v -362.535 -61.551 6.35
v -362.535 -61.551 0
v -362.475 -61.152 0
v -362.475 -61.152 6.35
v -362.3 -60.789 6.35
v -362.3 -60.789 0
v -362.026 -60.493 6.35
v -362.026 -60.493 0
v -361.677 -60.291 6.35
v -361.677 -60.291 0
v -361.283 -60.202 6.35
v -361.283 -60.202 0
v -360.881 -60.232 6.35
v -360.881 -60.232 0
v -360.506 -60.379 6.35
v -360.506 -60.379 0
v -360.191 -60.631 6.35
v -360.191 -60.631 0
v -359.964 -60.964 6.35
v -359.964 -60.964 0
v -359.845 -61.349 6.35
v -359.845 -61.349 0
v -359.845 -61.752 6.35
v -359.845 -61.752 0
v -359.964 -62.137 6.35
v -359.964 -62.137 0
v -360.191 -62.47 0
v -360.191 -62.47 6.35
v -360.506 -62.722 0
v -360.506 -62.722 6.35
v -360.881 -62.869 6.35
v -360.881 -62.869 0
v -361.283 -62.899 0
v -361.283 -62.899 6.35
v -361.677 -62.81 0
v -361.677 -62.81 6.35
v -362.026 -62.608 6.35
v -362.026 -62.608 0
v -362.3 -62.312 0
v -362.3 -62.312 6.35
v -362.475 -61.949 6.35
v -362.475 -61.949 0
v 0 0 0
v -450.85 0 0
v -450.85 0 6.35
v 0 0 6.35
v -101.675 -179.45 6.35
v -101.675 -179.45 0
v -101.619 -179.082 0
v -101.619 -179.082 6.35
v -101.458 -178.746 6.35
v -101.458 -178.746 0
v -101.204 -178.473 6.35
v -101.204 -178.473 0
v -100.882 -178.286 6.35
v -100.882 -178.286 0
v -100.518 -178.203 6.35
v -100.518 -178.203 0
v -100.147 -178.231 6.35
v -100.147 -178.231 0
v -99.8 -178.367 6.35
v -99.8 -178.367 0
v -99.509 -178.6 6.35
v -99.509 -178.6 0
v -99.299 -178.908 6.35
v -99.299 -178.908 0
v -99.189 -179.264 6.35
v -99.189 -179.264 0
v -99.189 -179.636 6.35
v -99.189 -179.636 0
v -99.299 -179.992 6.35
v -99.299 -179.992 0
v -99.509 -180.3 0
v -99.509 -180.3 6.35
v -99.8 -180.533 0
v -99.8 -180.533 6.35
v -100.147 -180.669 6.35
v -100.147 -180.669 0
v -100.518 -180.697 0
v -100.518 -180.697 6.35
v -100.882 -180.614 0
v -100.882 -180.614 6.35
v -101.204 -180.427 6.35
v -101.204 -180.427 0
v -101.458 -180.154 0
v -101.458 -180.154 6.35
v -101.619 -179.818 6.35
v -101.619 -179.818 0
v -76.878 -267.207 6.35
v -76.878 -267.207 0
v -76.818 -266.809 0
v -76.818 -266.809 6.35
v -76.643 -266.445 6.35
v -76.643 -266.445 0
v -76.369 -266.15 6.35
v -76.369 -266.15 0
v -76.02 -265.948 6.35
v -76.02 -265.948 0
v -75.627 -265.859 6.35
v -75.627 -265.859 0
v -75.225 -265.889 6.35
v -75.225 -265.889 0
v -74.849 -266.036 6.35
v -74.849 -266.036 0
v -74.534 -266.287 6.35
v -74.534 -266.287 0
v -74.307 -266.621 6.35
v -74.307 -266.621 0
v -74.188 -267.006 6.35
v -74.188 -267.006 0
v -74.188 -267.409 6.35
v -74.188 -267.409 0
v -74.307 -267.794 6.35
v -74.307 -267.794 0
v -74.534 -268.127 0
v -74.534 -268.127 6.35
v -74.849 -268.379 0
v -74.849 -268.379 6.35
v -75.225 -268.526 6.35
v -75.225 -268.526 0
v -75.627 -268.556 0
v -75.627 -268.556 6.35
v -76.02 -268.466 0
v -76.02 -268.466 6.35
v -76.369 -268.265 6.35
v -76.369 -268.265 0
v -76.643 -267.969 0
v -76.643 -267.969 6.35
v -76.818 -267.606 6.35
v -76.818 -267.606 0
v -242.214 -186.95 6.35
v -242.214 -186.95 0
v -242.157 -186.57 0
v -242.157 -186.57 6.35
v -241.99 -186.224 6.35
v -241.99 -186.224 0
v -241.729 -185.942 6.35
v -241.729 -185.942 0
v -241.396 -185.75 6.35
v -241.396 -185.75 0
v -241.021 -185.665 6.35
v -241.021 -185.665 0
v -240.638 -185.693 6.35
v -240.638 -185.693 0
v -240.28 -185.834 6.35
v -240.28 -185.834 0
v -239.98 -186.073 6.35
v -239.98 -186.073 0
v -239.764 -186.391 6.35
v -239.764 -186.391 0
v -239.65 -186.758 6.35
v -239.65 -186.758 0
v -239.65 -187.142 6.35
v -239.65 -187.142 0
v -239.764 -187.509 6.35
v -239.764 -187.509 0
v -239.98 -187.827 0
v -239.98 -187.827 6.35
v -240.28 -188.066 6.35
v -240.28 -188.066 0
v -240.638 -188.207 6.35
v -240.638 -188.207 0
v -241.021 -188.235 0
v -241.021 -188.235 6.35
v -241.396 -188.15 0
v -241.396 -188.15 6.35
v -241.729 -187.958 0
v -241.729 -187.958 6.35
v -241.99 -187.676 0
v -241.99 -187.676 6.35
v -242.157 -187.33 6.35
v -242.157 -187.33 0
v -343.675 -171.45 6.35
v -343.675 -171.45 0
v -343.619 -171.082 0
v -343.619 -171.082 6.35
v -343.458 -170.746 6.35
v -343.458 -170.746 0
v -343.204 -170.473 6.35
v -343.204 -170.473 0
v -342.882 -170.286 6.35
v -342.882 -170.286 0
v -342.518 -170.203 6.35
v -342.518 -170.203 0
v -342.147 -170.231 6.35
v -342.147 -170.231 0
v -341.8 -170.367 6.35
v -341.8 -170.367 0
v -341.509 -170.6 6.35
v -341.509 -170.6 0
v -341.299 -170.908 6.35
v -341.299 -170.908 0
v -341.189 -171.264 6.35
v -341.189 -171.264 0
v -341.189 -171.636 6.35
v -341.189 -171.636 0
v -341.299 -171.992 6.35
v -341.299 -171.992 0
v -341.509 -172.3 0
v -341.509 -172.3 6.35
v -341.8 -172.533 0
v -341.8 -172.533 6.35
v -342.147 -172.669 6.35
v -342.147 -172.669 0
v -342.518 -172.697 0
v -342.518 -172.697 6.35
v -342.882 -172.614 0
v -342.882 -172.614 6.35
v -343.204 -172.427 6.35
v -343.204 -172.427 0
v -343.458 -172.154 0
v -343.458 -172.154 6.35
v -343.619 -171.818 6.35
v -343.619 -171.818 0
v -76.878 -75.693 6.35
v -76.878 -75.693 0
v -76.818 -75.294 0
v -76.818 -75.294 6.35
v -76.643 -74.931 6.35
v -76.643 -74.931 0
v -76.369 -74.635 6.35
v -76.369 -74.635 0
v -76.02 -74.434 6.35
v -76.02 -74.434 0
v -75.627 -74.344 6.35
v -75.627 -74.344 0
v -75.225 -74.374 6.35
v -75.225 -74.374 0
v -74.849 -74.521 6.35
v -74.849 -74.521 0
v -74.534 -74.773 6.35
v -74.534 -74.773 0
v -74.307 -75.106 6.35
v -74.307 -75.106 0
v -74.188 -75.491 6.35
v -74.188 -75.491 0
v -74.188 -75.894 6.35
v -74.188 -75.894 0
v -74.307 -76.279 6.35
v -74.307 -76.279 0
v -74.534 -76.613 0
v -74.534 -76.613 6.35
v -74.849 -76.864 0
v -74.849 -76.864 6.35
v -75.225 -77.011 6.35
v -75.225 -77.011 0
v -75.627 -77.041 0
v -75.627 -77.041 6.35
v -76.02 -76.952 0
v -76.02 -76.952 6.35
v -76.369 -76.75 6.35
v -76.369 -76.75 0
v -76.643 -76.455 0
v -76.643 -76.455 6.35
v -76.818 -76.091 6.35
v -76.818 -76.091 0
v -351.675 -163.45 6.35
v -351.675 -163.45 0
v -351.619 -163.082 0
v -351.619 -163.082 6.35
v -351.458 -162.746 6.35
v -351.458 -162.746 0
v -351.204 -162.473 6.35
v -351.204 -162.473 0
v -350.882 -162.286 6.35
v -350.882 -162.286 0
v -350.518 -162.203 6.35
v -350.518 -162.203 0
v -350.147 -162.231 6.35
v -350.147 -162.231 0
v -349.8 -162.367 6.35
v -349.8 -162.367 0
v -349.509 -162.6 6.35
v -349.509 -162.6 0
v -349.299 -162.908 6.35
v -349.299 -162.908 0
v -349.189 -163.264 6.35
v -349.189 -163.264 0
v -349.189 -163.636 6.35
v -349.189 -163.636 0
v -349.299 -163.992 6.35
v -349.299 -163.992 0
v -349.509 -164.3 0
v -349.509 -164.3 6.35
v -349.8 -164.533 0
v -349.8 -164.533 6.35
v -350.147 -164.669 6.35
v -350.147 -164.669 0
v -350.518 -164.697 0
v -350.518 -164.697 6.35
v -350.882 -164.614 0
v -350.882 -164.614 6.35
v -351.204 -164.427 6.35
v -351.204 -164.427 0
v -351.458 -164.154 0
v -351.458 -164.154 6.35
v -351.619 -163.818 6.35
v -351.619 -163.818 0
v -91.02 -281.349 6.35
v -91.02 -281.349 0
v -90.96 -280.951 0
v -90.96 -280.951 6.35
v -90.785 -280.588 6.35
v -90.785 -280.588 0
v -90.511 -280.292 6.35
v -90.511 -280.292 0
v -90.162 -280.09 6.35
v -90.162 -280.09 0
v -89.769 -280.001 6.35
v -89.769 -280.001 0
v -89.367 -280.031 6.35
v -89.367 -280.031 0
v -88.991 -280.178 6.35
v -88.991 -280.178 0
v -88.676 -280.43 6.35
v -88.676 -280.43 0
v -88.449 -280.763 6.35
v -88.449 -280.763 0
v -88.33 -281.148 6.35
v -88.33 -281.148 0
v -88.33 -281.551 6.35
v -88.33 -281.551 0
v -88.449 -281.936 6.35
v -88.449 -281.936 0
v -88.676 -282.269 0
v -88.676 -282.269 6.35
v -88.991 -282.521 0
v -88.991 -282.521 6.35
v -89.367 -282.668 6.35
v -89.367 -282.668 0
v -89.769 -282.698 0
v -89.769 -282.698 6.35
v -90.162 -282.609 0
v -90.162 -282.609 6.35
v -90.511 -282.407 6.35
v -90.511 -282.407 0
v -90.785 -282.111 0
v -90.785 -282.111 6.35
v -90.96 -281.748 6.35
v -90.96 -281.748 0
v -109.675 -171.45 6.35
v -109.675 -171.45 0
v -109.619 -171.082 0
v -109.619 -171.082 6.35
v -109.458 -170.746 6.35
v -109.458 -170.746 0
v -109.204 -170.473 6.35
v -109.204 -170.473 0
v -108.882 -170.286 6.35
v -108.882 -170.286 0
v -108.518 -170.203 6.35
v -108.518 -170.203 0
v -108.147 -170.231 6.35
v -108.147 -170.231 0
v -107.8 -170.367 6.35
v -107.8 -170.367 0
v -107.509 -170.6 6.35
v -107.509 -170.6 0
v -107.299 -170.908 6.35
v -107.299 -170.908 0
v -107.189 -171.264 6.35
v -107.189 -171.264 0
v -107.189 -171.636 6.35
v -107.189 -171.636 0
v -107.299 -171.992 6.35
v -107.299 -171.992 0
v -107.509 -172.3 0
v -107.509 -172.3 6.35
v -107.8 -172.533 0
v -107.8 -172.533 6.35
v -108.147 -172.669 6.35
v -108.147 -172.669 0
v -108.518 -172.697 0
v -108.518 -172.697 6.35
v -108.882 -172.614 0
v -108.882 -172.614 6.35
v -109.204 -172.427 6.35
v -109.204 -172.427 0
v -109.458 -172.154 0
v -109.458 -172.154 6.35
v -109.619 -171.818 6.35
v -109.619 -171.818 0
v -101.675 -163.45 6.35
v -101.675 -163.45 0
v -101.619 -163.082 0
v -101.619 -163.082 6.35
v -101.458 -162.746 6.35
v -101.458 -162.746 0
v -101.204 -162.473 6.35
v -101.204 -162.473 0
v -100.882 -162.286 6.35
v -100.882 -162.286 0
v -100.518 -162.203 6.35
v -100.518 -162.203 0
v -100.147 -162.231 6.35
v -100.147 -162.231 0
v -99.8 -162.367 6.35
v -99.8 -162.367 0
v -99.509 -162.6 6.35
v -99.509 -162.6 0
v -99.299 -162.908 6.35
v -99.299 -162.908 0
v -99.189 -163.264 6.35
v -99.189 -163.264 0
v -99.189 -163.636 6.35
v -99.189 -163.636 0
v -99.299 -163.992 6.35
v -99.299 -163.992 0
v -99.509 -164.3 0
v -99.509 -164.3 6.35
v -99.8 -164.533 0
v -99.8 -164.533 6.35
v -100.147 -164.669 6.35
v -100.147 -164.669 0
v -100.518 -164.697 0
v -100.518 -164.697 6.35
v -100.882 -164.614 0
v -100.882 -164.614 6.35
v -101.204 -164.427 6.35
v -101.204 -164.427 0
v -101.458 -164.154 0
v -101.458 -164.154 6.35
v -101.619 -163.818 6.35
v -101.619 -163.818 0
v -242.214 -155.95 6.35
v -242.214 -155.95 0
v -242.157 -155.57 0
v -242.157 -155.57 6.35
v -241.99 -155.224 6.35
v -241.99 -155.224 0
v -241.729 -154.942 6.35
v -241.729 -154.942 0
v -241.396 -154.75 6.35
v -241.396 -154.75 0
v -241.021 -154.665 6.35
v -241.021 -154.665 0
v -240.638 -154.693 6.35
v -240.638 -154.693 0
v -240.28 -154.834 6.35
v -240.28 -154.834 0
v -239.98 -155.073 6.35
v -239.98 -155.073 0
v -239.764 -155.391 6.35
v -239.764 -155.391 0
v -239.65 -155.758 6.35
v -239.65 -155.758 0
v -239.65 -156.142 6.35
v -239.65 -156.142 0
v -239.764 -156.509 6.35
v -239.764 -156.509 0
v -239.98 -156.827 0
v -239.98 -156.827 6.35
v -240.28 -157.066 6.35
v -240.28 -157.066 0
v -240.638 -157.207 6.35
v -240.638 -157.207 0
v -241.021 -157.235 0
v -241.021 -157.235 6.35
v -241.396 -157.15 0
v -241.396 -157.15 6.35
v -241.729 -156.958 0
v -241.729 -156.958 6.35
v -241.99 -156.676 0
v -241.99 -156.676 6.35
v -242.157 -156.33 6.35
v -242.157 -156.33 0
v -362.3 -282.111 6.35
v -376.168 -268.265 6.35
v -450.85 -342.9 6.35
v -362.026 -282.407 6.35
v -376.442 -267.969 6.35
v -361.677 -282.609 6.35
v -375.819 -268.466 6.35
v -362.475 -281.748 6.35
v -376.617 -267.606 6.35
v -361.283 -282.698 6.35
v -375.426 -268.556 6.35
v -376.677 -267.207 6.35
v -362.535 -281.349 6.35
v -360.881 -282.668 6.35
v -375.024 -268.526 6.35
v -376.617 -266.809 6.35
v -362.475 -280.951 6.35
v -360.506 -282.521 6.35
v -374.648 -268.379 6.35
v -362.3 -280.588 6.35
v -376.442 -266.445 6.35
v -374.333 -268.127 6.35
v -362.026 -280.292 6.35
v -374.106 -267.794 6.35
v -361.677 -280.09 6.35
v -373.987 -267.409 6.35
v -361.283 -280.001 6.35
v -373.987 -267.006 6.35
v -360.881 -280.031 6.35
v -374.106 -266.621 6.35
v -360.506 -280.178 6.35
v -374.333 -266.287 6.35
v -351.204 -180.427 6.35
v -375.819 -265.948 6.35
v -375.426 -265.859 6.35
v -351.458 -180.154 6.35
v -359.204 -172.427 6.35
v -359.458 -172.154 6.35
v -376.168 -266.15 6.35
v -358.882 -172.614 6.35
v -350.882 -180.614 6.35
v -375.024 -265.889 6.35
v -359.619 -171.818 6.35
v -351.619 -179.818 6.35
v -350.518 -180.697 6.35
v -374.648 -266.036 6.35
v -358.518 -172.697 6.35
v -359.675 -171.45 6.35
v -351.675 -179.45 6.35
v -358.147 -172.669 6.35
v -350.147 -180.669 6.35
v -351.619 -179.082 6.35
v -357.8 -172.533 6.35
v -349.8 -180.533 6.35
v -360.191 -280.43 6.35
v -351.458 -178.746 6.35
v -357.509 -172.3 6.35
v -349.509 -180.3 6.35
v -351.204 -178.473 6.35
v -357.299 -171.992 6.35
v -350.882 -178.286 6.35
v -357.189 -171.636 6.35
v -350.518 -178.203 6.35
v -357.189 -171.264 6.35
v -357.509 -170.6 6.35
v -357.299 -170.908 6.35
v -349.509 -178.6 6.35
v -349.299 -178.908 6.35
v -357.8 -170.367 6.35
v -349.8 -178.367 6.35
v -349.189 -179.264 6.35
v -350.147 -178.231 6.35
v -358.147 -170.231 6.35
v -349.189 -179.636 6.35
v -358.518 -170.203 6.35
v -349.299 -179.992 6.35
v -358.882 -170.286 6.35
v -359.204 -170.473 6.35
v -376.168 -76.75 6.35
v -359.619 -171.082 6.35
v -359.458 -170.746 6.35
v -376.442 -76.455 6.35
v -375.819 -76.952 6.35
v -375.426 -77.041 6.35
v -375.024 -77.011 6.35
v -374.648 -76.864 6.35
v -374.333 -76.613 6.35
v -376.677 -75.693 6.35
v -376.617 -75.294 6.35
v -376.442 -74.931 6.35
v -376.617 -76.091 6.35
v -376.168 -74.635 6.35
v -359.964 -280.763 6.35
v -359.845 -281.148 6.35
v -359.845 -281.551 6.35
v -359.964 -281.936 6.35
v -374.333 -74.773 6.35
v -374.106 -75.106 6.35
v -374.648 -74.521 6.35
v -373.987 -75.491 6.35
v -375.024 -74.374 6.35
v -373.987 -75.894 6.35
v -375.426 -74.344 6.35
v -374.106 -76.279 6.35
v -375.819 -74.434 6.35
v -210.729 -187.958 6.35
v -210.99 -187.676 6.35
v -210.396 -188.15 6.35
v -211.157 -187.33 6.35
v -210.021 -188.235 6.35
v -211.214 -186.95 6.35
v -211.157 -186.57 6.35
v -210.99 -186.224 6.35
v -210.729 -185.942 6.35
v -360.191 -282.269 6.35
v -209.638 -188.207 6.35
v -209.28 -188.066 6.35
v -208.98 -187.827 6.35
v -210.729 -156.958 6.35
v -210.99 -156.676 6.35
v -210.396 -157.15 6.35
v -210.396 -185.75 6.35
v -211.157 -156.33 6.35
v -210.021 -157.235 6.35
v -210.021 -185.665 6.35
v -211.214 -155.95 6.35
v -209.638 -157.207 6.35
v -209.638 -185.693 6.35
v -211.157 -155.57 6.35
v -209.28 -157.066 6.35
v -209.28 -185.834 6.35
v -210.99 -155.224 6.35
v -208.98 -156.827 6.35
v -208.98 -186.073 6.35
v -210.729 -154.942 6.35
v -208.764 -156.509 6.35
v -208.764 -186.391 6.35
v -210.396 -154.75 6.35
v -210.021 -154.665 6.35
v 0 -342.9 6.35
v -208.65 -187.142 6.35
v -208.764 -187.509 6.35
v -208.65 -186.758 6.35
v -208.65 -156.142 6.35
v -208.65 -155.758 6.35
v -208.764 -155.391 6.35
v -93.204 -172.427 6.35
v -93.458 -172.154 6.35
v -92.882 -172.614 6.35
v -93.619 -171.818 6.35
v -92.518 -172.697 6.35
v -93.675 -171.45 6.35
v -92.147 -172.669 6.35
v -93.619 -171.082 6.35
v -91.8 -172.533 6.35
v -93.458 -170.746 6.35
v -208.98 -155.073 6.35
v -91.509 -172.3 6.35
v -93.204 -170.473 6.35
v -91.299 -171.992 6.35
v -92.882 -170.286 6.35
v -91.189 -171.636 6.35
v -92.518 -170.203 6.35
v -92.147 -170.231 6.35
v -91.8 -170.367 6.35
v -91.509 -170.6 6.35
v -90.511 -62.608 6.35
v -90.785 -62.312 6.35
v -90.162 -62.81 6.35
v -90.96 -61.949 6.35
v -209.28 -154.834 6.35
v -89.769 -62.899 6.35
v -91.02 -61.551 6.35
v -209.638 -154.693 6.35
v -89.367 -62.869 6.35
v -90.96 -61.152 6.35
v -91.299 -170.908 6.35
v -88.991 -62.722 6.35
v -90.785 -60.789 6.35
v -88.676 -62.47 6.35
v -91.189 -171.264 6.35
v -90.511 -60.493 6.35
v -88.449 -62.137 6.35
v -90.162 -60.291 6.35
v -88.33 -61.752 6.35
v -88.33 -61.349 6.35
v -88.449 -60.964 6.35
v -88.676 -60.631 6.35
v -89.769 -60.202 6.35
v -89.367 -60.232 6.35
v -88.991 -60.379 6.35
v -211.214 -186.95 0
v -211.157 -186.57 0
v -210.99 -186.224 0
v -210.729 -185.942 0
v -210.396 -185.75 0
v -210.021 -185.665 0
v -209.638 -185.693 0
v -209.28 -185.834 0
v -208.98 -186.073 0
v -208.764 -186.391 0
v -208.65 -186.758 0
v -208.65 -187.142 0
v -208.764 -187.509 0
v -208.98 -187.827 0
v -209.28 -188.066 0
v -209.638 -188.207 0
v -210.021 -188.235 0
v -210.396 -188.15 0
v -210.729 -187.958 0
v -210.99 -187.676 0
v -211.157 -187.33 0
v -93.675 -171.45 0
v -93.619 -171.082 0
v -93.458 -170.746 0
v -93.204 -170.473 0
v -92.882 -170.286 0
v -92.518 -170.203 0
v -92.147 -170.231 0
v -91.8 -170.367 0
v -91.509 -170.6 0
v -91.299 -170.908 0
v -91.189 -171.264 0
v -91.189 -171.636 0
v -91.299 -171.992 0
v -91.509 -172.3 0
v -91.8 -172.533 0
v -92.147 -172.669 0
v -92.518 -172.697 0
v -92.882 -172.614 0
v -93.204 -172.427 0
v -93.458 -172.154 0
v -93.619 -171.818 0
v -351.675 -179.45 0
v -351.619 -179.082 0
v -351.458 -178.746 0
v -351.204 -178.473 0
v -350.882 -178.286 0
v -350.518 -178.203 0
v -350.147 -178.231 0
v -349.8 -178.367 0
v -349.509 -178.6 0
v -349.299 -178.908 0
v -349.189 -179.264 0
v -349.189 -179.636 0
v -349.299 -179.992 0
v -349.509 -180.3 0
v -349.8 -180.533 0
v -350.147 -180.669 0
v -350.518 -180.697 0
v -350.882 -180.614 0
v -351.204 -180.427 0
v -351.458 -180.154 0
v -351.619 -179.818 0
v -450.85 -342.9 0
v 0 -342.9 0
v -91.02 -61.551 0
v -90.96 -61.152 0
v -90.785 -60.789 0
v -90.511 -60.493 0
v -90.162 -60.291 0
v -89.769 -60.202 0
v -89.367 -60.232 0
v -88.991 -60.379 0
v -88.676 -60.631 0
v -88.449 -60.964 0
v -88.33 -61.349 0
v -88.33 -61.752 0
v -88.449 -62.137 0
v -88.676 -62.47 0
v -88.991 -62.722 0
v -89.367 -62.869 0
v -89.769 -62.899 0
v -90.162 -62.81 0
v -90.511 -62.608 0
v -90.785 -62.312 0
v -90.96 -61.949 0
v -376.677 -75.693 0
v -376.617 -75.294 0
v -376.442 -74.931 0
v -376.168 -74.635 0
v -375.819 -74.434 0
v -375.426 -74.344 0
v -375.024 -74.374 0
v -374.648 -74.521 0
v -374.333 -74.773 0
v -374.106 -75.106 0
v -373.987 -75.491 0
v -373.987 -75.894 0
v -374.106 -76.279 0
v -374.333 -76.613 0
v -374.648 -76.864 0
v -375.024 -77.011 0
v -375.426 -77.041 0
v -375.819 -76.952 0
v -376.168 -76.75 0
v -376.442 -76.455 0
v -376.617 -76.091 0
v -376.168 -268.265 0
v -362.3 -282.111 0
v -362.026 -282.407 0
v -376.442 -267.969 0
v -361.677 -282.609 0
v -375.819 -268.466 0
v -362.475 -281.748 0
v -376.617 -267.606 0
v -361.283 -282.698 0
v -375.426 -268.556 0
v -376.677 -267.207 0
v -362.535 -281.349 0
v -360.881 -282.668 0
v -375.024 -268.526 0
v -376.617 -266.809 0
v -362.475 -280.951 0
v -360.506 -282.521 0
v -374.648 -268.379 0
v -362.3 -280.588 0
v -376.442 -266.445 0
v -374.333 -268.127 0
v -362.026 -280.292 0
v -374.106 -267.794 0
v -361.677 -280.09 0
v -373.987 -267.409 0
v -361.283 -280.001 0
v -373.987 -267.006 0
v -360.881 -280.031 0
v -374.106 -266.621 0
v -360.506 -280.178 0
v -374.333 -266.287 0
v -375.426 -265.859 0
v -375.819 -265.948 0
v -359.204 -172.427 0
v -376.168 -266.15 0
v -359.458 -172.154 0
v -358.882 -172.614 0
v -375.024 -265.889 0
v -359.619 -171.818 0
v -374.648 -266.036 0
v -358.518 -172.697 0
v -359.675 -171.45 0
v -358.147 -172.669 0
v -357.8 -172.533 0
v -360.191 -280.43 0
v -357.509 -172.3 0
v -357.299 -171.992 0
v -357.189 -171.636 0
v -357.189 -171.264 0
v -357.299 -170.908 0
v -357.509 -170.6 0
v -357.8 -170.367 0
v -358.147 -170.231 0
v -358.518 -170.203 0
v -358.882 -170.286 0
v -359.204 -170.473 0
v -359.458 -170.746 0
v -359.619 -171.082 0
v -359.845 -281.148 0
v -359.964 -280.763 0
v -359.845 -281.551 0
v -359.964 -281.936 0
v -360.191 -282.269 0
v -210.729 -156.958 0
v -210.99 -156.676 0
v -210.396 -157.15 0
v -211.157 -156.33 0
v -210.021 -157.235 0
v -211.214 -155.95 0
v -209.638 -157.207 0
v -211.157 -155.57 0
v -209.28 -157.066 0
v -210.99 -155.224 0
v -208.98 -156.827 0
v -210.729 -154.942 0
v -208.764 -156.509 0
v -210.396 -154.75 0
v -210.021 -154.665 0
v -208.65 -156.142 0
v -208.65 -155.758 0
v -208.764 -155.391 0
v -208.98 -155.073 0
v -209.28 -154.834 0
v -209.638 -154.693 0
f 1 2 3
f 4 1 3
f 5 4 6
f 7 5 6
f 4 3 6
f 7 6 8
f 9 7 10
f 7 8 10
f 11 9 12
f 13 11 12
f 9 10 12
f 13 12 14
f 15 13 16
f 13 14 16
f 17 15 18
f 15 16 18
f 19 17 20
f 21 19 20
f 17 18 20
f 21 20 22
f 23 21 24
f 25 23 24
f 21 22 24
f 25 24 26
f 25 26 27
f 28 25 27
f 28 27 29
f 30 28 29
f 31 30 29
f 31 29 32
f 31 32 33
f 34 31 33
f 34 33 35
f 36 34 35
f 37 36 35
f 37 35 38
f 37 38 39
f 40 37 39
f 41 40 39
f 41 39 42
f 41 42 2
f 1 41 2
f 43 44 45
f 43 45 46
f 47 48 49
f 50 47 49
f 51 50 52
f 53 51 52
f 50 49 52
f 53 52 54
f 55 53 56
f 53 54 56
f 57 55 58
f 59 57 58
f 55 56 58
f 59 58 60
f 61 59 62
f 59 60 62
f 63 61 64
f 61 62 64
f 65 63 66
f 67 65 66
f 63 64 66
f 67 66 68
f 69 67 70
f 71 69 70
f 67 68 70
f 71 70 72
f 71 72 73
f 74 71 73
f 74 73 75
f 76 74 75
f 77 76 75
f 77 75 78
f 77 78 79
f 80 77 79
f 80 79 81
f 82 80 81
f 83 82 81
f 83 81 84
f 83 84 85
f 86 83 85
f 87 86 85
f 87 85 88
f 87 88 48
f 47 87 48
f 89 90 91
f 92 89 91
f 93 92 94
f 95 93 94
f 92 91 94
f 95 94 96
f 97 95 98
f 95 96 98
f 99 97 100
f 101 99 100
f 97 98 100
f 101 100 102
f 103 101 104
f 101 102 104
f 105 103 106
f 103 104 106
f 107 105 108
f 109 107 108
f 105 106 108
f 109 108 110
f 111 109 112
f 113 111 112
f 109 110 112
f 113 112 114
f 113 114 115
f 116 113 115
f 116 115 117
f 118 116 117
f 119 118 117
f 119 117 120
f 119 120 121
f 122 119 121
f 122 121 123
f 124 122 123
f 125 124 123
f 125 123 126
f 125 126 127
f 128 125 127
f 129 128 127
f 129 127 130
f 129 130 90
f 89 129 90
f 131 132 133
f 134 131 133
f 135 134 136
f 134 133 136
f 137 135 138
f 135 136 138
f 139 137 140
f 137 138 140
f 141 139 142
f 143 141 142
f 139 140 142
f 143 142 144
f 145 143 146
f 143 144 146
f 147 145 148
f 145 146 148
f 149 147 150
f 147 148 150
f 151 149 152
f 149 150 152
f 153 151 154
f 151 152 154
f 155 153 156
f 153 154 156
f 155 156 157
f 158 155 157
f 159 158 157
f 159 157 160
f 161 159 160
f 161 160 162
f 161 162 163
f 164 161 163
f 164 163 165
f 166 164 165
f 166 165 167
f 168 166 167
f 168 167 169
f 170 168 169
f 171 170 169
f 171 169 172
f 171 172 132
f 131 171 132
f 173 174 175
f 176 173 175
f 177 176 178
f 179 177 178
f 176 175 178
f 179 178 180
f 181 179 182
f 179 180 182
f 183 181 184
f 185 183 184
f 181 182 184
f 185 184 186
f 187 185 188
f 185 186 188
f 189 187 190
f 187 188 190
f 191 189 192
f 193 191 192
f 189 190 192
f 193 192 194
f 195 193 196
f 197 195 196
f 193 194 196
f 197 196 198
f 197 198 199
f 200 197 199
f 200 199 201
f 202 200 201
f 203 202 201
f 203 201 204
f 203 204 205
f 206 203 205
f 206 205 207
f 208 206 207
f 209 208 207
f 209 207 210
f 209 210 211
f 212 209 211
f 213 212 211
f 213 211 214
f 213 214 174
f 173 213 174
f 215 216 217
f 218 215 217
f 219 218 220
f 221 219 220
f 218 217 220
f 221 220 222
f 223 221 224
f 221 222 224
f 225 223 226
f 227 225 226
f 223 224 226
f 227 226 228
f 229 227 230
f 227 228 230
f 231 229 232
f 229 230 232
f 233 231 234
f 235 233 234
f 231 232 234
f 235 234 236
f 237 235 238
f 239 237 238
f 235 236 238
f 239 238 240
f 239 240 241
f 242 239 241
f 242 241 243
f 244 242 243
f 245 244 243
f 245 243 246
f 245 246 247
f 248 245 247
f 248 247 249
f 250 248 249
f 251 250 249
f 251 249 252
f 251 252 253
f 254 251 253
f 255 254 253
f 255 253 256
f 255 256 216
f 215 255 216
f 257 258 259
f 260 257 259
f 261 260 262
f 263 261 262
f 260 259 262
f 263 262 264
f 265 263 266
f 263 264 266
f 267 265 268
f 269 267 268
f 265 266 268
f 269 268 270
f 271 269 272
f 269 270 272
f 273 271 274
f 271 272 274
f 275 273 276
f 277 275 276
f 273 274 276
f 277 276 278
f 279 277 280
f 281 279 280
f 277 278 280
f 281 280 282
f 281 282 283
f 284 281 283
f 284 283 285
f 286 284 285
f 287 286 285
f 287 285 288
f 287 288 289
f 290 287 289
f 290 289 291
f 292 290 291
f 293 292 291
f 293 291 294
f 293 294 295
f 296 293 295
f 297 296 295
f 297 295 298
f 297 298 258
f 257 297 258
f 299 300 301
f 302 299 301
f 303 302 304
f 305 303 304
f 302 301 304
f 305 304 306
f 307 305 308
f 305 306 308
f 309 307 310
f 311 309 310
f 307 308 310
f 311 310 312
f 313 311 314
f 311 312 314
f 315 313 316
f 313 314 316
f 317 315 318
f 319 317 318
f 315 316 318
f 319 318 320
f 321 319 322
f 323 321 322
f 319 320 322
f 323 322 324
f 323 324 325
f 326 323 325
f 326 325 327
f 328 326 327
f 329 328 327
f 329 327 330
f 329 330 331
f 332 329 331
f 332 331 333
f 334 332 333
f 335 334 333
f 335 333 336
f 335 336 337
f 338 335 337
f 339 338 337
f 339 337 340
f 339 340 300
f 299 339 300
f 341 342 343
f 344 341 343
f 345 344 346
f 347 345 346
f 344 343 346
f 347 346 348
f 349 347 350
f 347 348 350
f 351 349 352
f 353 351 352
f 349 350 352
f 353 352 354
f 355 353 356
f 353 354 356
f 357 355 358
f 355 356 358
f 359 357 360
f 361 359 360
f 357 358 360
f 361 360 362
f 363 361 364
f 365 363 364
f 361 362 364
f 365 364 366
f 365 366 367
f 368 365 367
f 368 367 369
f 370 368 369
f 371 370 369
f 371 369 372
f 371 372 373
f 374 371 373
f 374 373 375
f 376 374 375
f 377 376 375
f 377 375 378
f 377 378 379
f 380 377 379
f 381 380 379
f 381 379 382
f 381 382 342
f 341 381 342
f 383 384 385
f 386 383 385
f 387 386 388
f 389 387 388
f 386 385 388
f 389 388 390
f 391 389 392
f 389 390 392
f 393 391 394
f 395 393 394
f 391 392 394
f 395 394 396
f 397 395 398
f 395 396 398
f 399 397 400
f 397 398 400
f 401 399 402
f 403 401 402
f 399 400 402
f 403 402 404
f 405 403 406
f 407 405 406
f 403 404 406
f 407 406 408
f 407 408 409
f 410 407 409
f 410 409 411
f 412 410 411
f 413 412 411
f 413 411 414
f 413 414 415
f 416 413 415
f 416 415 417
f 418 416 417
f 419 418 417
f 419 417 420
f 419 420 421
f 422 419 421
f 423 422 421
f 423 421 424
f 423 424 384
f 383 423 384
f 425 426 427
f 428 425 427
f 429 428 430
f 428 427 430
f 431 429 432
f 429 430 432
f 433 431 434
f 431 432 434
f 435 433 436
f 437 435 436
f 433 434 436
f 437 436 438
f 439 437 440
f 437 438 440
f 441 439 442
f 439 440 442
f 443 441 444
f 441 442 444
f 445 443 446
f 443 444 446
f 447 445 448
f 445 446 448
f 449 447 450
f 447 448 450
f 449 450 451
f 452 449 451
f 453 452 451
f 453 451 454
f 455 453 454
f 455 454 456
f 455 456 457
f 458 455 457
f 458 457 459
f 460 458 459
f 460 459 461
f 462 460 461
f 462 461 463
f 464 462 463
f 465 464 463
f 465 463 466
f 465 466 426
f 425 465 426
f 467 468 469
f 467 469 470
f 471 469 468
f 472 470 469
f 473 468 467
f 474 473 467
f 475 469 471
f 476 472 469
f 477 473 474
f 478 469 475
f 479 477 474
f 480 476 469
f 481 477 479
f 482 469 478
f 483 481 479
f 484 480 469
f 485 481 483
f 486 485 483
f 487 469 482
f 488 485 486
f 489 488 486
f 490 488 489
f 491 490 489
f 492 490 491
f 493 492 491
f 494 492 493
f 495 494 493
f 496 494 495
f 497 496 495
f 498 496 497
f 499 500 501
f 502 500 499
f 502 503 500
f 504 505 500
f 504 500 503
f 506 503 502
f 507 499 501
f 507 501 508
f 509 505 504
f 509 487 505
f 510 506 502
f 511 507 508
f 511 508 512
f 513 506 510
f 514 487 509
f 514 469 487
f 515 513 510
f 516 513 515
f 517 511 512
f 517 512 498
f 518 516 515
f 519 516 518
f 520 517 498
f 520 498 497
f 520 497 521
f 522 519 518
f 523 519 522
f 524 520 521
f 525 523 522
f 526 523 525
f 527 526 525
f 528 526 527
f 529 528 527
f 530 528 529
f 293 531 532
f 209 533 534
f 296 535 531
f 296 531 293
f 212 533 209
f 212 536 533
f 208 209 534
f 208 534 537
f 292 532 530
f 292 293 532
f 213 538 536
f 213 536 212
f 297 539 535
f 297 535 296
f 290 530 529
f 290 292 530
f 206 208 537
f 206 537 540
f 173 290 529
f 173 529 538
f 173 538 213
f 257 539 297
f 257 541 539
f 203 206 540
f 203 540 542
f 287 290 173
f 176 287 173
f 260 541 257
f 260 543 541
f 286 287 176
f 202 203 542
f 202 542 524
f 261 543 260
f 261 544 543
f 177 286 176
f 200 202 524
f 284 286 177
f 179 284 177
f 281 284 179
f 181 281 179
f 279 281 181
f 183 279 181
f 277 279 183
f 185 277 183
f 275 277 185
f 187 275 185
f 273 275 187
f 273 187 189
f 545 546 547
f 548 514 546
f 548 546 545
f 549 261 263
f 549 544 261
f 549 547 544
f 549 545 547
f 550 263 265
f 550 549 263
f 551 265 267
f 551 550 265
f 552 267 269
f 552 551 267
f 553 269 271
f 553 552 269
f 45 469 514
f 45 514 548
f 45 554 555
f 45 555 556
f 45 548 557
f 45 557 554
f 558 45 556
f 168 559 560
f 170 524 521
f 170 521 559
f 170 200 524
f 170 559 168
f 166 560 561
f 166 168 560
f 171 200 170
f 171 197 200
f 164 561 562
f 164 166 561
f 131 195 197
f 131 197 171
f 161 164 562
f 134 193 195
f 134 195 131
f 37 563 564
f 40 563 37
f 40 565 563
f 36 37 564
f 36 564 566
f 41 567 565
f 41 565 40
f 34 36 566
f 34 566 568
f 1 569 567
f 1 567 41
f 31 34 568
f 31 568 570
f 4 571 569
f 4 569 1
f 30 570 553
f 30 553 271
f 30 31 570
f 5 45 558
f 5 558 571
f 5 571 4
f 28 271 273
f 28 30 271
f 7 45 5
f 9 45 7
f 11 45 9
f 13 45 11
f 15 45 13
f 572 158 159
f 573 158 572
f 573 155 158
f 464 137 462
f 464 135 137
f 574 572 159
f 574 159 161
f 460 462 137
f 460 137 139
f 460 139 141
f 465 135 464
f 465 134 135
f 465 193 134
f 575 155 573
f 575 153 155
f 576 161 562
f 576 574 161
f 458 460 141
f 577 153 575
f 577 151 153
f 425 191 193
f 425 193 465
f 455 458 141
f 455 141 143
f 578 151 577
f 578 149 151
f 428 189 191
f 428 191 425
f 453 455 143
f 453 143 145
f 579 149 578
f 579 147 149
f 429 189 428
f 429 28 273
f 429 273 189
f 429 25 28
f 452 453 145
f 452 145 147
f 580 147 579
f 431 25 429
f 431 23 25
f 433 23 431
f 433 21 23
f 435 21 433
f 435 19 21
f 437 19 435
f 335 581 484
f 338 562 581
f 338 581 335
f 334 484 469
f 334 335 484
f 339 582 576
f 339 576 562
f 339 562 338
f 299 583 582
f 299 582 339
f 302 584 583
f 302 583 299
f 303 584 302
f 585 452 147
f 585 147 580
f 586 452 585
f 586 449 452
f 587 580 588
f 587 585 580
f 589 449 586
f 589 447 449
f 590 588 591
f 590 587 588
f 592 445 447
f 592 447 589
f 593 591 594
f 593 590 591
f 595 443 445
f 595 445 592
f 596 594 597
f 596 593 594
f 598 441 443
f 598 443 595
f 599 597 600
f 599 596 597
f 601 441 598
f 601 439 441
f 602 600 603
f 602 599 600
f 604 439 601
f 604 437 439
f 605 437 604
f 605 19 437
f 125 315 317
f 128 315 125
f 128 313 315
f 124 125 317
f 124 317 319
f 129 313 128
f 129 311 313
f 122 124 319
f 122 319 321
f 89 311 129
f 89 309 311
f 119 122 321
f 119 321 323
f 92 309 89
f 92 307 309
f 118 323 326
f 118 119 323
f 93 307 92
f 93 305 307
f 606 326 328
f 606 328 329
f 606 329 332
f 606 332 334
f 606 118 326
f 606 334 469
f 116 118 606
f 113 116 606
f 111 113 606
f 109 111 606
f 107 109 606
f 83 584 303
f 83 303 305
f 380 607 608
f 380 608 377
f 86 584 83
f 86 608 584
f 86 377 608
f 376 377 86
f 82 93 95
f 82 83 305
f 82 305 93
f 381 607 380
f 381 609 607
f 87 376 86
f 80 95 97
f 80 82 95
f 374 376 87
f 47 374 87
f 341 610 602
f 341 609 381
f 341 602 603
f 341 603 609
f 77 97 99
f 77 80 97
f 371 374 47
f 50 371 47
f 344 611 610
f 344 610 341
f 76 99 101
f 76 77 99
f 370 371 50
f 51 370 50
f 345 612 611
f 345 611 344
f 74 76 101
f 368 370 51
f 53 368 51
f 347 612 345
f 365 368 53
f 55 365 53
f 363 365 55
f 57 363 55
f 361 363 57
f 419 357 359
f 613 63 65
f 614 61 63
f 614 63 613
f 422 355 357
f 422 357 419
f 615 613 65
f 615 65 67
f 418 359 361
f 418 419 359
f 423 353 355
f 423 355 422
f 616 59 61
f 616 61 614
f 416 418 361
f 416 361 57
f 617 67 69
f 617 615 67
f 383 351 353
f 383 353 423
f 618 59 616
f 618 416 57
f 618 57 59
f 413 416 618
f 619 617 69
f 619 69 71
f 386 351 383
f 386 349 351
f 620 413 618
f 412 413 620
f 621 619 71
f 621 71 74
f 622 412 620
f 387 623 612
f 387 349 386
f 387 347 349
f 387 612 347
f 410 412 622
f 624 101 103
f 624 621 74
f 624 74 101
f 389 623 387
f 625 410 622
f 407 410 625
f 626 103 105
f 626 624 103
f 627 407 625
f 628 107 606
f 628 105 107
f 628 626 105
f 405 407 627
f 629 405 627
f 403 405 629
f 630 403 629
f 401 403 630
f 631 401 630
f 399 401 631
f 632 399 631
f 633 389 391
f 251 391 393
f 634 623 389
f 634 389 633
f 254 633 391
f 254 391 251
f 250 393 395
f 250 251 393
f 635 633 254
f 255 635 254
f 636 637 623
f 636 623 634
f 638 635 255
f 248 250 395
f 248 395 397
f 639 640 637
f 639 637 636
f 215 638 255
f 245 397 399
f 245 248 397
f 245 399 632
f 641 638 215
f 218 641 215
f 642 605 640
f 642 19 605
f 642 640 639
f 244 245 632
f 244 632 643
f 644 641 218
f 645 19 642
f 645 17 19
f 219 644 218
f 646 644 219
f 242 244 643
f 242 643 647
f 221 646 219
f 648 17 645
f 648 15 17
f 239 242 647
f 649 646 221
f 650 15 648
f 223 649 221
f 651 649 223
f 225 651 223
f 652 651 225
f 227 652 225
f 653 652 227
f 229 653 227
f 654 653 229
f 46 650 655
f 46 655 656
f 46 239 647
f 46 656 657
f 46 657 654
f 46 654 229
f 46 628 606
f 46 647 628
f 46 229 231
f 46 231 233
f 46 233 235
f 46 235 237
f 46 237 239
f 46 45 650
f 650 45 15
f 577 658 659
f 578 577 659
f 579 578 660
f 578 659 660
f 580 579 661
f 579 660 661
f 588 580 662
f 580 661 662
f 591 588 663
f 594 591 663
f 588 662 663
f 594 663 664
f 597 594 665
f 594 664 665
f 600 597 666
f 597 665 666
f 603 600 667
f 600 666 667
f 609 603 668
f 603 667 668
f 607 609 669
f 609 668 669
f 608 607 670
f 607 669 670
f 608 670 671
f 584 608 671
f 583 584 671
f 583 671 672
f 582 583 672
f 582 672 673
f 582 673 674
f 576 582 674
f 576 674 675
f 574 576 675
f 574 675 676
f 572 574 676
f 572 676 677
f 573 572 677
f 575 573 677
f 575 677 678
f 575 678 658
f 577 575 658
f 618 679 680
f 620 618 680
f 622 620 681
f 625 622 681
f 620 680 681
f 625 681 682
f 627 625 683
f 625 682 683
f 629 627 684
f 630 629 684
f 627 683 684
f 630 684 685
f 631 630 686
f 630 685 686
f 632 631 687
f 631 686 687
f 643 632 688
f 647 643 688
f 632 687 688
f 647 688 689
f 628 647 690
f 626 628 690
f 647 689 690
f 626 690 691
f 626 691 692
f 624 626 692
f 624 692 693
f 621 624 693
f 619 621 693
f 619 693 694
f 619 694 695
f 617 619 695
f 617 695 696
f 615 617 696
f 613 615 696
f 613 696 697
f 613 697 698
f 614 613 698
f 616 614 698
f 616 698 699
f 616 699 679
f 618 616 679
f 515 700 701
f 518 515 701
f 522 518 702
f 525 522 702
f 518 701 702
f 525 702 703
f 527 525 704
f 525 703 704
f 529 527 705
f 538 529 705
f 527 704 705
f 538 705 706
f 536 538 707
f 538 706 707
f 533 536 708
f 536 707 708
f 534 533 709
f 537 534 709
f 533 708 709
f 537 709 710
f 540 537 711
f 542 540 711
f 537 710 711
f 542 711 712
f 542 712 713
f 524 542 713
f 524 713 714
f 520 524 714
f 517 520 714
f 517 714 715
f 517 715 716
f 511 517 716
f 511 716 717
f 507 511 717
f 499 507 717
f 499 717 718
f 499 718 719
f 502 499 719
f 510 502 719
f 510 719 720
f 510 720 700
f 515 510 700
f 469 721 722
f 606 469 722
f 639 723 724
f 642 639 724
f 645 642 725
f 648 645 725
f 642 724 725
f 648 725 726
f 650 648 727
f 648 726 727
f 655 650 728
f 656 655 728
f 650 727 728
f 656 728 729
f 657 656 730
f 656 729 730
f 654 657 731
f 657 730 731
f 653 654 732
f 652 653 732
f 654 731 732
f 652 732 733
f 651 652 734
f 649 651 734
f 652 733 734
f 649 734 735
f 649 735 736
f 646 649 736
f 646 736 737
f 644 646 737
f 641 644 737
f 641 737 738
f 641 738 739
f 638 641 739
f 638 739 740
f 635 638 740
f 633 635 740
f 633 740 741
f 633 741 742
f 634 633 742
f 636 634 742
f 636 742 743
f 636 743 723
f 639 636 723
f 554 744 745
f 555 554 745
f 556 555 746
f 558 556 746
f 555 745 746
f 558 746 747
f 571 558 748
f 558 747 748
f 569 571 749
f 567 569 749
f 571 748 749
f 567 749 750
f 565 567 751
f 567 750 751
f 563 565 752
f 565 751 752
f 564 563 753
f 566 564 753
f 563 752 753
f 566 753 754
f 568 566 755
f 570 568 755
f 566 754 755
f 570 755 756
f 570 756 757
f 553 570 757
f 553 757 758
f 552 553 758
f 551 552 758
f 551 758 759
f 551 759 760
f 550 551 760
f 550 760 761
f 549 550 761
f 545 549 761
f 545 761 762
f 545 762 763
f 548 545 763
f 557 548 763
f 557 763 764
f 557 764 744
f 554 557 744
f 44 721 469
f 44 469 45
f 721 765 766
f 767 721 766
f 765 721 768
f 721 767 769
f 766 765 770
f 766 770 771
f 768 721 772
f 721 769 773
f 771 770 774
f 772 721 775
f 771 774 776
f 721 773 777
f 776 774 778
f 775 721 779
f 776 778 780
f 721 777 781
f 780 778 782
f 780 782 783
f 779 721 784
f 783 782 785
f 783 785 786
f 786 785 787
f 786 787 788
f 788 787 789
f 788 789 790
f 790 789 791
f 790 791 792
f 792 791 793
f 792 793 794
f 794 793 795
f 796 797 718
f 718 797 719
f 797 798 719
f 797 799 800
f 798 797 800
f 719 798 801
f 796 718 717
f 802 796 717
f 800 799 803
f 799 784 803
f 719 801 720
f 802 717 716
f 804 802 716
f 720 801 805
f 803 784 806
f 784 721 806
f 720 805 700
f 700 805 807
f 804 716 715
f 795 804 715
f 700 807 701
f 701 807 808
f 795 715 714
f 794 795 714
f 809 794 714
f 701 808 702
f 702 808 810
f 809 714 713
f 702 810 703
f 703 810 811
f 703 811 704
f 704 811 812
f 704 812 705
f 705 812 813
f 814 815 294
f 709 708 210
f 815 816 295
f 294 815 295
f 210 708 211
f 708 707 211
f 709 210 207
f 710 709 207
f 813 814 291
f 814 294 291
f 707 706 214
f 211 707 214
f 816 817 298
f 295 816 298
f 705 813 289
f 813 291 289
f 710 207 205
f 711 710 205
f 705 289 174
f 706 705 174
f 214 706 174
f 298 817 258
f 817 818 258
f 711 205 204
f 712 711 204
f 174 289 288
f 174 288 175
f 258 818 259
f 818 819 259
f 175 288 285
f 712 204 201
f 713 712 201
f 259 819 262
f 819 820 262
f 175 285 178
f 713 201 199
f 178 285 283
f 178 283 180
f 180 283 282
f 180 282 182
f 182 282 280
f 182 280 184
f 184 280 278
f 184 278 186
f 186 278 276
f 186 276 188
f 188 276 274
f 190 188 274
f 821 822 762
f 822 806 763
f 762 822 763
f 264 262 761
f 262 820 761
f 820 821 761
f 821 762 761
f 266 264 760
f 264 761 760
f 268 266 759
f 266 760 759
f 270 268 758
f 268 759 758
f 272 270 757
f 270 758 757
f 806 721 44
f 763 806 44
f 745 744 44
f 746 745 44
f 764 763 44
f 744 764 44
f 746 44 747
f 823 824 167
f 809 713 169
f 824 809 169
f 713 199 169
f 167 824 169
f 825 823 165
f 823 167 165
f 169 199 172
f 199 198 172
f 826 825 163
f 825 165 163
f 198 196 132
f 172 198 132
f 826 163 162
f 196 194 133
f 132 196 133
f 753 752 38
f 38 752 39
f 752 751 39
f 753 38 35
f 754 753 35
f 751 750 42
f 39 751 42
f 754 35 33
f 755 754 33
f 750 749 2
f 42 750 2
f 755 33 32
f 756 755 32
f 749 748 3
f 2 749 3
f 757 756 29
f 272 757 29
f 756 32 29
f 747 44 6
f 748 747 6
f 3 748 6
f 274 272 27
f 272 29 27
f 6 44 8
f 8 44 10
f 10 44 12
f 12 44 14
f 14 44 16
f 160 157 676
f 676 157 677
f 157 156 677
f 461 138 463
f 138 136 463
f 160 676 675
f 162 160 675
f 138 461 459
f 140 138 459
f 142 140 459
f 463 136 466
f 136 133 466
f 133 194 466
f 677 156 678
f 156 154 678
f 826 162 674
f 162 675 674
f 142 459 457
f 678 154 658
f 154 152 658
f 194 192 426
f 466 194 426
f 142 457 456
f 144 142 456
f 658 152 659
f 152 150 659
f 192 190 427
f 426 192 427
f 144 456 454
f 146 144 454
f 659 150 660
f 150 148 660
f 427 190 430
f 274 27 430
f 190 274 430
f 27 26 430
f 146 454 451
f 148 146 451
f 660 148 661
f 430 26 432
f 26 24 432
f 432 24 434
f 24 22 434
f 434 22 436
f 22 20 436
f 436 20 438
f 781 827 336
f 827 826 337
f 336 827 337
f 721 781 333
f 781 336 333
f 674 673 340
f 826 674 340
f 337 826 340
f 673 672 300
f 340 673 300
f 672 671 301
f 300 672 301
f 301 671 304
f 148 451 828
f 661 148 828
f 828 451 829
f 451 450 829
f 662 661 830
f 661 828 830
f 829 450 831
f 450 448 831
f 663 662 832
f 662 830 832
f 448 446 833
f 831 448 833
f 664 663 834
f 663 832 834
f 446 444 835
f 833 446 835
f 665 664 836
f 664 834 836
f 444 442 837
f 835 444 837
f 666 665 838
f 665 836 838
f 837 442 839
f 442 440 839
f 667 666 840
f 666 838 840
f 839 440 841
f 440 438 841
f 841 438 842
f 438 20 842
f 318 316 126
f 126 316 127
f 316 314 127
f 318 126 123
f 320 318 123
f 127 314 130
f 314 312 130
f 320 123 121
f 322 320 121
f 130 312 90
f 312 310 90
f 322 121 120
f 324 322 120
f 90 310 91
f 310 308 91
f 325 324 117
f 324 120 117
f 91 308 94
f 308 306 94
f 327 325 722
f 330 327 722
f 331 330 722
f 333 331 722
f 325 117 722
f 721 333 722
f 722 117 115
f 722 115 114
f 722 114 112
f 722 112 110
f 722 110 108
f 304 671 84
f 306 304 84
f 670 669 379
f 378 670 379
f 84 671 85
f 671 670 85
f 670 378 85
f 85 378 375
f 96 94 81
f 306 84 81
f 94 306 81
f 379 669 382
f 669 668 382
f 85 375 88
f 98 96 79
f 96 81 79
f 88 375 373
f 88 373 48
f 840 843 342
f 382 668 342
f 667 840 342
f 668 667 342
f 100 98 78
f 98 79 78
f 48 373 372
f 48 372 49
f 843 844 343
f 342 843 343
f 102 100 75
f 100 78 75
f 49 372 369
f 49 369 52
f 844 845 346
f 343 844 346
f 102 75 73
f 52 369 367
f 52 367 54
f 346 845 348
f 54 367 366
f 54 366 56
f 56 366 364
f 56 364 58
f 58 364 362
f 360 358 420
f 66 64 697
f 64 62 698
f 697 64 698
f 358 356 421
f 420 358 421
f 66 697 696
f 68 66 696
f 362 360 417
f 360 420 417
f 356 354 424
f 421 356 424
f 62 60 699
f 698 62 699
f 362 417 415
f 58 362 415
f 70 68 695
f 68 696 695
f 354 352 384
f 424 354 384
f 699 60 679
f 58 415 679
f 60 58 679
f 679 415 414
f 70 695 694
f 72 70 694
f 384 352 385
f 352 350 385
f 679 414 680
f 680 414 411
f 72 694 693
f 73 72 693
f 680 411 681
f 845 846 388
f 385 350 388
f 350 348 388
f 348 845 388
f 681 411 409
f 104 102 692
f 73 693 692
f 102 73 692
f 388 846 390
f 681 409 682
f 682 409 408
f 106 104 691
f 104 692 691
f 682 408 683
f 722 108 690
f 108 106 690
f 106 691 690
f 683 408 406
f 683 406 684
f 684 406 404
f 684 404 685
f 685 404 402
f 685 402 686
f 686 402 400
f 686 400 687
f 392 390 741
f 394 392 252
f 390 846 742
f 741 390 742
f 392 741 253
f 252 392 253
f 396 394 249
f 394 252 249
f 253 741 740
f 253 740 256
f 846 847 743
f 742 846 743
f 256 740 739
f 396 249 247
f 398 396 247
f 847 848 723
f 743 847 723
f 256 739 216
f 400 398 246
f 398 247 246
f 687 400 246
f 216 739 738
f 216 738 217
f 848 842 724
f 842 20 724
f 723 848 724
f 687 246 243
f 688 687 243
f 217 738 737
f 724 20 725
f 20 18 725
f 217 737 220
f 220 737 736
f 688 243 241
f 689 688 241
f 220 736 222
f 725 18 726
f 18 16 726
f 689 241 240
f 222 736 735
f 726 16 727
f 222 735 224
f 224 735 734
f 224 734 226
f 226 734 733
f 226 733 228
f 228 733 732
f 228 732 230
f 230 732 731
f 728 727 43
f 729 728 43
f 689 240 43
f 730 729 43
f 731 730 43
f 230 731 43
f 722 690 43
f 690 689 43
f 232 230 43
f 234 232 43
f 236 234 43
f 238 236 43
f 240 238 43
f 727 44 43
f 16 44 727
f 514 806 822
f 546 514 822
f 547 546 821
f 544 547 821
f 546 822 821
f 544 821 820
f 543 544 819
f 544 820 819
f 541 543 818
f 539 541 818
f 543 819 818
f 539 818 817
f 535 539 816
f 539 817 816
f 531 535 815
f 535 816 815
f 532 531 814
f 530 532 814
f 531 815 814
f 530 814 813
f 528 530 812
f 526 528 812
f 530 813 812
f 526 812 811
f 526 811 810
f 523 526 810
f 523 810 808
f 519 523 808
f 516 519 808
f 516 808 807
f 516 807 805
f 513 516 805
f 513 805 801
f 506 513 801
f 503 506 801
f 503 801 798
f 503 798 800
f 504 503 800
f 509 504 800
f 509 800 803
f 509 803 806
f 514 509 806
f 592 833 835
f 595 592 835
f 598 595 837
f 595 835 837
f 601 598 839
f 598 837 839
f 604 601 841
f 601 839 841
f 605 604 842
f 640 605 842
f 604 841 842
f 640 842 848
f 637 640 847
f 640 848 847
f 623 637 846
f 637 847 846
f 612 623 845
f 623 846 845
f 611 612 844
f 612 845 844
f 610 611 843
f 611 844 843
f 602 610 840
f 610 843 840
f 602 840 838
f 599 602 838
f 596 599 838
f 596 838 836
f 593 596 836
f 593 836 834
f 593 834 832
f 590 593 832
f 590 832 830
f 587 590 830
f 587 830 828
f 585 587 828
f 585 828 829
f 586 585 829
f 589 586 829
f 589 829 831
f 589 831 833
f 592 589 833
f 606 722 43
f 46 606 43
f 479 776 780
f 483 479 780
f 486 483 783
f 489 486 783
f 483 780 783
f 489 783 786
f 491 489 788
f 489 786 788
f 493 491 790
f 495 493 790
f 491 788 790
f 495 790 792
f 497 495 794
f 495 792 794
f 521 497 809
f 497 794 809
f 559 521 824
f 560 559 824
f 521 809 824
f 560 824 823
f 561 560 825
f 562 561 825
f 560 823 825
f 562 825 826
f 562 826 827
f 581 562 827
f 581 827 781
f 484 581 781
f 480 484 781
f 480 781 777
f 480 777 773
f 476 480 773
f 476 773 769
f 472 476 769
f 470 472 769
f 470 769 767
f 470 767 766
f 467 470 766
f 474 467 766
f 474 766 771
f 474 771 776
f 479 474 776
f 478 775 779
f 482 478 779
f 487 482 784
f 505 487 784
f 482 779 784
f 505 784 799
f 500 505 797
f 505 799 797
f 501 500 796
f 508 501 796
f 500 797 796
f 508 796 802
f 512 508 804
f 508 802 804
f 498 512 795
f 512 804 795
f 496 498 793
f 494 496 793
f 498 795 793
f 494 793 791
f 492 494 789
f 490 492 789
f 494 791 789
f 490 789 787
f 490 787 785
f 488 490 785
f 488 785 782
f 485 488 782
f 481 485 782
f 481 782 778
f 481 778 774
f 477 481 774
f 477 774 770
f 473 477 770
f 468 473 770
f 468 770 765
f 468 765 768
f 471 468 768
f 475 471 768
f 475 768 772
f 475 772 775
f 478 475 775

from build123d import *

# Parameters (mm, degrees)
F0_W     = 450.85
F0_H     = 342.9
F1_DEPTH = 6.35
F3_D     = 2.5781
F3_DEPTH = 13.905
F3_TIP   = 0.774539381
F4_D     = 2.5
F5_D     = 2.5
F6_D     = 2.7051


with BuildPart() as f1:
    # F0 (on Top) → F1 (new body)
    with BuildSketch(Plane.XY):
        with Locations((-225.425, -171.45)):
            Rectangle(F0_W, F0_H)
    extrude(amount=F1_DEPTH)

    # F3
    with Locations(Plane.XY.offset(6.35)):
        with Locations((-240.925, -155.95), (-209.925, -155.95), (-209.925, -186.95), (-240.925, -186.95)):
            Hole(F3_D / 2, depth=F3_DEPTH)
            with Locations((0, 0, -(F3_DEPTH + F3_TIP / 2))):  # 118° drill point
                Cone(0, F3_D / 2, F3_TIP, mode=Mode.SUBTRACT)

    # F4 (through all)
    with Locations(Plane.XY.offset(6.35)):
        with Locations((-342.425, -171.45), (-358.425, -171.45), (-350.425, -163.45), (-350.425, -179.45)):
            Hole(F4_D / 2)

    # F5 (through all)
    with Locations(Plane.XY.offset(6.35)):
        with Locations((-100.425, -163.45), (-108.425, -171.45), (-100.425, -179.45), (-92.425, -171.45)):
            Hole(F5_D / 2)

    # F6 (through all)
    with Locations(Plane.XY.offset(6.35)):
        with Locations((-361.18236, -61.55051), (-375.32449, -75.69264), (-89.66764, -61.55051), (-75.52551, -75.69264), (-75.52551, -267.20736), (-89.66764, -281.34949), (-361.18236, -281.34949), (-375.32449, -267.20736)):
            Hole(F6_D / 2)


solid = f1.part
